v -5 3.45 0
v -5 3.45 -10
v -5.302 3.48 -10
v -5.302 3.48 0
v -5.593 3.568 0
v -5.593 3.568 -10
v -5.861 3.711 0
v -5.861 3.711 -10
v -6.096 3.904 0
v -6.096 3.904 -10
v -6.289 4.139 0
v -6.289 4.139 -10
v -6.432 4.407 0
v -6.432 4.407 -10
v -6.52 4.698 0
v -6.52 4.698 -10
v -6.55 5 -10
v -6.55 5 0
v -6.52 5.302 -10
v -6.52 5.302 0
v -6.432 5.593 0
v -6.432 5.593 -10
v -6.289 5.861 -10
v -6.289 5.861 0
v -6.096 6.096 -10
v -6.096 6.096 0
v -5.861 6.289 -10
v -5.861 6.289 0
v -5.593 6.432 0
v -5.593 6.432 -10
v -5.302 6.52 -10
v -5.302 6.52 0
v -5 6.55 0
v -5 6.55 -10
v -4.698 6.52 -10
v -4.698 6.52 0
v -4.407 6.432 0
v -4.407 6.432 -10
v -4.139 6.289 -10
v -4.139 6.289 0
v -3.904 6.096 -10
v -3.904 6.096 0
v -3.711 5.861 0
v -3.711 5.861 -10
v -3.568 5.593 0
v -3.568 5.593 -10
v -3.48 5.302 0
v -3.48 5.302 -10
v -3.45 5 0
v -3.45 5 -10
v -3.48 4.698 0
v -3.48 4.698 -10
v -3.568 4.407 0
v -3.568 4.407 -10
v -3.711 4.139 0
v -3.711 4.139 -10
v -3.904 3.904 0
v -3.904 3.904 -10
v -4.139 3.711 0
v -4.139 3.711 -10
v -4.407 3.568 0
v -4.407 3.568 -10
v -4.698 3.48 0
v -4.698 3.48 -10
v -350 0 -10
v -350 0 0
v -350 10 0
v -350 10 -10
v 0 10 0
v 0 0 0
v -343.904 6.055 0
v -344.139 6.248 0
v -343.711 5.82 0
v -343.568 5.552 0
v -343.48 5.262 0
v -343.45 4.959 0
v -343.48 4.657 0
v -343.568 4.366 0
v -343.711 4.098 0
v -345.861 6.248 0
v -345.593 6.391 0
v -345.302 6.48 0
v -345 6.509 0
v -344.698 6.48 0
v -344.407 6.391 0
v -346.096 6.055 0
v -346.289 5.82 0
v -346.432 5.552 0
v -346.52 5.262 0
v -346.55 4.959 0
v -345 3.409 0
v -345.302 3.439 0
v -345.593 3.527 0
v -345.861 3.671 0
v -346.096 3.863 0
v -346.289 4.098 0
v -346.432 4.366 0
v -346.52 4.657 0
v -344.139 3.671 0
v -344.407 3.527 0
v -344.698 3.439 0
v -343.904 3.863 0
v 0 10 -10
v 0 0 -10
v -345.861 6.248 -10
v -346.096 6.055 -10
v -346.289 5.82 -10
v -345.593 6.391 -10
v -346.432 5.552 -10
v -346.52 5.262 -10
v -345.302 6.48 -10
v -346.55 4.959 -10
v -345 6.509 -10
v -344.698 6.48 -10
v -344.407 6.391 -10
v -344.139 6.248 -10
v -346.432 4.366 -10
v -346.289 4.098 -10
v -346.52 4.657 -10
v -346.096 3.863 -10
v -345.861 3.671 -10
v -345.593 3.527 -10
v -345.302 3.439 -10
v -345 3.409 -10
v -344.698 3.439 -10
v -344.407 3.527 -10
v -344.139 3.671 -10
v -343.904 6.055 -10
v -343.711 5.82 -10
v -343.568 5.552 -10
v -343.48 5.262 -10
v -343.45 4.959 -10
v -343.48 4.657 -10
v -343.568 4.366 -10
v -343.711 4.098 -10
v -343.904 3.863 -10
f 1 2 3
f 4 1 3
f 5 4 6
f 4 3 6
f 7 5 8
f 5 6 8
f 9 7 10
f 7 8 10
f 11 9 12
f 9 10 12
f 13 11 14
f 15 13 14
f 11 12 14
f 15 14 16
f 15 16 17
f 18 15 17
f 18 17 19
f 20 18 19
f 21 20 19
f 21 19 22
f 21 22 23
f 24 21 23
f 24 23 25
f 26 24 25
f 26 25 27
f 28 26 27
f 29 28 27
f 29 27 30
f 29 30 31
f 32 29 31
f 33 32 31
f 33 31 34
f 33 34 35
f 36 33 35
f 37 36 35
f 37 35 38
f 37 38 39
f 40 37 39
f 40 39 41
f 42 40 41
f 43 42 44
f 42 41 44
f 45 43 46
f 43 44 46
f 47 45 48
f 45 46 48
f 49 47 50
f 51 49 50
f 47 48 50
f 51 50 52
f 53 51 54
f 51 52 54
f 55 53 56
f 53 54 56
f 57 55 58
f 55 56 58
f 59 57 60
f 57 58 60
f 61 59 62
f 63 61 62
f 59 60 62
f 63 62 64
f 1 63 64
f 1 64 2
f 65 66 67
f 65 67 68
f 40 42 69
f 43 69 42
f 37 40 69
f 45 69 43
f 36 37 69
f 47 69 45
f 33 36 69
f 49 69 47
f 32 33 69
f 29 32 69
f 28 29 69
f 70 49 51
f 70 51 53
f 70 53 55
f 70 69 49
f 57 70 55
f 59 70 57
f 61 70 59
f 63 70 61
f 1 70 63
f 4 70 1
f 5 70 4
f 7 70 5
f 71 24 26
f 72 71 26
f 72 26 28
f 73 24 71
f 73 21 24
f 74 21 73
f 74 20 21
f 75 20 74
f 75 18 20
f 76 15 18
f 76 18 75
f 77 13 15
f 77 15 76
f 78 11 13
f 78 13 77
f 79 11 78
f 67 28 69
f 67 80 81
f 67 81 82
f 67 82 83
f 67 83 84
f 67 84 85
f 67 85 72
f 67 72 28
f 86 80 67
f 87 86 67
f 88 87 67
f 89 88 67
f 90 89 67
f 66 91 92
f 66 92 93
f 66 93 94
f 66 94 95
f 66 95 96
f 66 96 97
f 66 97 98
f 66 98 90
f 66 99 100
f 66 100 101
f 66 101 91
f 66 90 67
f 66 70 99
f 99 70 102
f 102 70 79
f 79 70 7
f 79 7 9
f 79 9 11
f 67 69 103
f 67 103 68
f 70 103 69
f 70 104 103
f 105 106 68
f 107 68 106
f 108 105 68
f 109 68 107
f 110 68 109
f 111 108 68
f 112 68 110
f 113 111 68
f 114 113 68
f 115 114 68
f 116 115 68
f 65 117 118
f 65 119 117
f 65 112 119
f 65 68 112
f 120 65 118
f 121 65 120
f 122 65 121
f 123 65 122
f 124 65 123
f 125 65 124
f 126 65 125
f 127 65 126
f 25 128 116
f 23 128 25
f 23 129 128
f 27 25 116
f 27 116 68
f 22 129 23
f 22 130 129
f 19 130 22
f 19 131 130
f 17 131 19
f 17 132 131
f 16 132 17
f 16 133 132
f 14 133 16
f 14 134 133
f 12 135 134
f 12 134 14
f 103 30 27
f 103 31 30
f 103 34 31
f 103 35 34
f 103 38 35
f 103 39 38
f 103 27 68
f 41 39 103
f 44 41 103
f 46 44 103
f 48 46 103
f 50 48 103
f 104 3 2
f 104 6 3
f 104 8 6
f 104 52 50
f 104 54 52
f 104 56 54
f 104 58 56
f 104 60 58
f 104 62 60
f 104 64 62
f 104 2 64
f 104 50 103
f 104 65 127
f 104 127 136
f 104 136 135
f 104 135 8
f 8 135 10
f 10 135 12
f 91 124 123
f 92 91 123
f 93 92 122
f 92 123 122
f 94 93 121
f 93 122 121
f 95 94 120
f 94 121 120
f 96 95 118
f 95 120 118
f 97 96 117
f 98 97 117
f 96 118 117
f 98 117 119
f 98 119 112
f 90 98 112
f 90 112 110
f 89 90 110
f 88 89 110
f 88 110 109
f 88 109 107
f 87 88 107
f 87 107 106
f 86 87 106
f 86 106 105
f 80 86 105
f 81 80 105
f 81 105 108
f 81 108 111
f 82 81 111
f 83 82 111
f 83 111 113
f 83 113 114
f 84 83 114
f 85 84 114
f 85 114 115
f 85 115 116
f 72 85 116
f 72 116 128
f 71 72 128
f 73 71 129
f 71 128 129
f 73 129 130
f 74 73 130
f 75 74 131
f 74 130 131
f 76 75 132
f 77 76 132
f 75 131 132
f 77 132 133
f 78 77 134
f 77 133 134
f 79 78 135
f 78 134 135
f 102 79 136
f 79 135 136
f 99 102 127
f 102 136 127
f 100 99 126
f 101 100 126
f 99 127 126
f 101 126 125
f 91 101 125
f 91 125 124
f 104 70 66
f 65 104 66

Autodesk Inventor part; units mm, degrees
ref_plane "YZ Plane" through (0, 0, 0) normal (1, 0, 0) x (0, 1, 0)
ref_plane "XZ Plane" through (0, 0, 0) normal (0, 1, 0) x (-1, 0, 0)
ref_plane "XY Plane" through (0, 0, 0) normal (0, 0, 1) x (1, 0, 0)
sketch "スケッチ1" plane through (0, 0, 0) normal (0, 1, 0) x (-1, 0, 0)
  line L0 (0, 0) -> (350, 0)
  line L1 (350, 0) -> (350, -10)
  line L2 (350, -10) -> (0, -10)
  line L3 (0, -10) -> (0, 0)
  dimension "d0" = 350
  dimension "d1" = 10
extrude "押し出し1" add sketch "スケッチ1" along normal blind 10
sketch "スケッチ2" plane through (-350, 0, 0) normal (0, 0, 1) x (1, 0, 0)
  line L0 (350, 0) -> (350, 10) projected
  line L1 (0, 0) -> (0, 10) projected
  point P0 (345, 5)
  point P1 (5, 4.9593)
  point P2 (350, 5)
  point P3 (350, 5)
  point P4 (0, 5)
  dimension "d4" = 5
  dimension "d5" = 5
hole "穴1" at (-5, 5, 0) at (-345, 4.9593, 0) direction (0, 0, -1) diameter 3.1 end through all
properties part number "SokuYoko"
